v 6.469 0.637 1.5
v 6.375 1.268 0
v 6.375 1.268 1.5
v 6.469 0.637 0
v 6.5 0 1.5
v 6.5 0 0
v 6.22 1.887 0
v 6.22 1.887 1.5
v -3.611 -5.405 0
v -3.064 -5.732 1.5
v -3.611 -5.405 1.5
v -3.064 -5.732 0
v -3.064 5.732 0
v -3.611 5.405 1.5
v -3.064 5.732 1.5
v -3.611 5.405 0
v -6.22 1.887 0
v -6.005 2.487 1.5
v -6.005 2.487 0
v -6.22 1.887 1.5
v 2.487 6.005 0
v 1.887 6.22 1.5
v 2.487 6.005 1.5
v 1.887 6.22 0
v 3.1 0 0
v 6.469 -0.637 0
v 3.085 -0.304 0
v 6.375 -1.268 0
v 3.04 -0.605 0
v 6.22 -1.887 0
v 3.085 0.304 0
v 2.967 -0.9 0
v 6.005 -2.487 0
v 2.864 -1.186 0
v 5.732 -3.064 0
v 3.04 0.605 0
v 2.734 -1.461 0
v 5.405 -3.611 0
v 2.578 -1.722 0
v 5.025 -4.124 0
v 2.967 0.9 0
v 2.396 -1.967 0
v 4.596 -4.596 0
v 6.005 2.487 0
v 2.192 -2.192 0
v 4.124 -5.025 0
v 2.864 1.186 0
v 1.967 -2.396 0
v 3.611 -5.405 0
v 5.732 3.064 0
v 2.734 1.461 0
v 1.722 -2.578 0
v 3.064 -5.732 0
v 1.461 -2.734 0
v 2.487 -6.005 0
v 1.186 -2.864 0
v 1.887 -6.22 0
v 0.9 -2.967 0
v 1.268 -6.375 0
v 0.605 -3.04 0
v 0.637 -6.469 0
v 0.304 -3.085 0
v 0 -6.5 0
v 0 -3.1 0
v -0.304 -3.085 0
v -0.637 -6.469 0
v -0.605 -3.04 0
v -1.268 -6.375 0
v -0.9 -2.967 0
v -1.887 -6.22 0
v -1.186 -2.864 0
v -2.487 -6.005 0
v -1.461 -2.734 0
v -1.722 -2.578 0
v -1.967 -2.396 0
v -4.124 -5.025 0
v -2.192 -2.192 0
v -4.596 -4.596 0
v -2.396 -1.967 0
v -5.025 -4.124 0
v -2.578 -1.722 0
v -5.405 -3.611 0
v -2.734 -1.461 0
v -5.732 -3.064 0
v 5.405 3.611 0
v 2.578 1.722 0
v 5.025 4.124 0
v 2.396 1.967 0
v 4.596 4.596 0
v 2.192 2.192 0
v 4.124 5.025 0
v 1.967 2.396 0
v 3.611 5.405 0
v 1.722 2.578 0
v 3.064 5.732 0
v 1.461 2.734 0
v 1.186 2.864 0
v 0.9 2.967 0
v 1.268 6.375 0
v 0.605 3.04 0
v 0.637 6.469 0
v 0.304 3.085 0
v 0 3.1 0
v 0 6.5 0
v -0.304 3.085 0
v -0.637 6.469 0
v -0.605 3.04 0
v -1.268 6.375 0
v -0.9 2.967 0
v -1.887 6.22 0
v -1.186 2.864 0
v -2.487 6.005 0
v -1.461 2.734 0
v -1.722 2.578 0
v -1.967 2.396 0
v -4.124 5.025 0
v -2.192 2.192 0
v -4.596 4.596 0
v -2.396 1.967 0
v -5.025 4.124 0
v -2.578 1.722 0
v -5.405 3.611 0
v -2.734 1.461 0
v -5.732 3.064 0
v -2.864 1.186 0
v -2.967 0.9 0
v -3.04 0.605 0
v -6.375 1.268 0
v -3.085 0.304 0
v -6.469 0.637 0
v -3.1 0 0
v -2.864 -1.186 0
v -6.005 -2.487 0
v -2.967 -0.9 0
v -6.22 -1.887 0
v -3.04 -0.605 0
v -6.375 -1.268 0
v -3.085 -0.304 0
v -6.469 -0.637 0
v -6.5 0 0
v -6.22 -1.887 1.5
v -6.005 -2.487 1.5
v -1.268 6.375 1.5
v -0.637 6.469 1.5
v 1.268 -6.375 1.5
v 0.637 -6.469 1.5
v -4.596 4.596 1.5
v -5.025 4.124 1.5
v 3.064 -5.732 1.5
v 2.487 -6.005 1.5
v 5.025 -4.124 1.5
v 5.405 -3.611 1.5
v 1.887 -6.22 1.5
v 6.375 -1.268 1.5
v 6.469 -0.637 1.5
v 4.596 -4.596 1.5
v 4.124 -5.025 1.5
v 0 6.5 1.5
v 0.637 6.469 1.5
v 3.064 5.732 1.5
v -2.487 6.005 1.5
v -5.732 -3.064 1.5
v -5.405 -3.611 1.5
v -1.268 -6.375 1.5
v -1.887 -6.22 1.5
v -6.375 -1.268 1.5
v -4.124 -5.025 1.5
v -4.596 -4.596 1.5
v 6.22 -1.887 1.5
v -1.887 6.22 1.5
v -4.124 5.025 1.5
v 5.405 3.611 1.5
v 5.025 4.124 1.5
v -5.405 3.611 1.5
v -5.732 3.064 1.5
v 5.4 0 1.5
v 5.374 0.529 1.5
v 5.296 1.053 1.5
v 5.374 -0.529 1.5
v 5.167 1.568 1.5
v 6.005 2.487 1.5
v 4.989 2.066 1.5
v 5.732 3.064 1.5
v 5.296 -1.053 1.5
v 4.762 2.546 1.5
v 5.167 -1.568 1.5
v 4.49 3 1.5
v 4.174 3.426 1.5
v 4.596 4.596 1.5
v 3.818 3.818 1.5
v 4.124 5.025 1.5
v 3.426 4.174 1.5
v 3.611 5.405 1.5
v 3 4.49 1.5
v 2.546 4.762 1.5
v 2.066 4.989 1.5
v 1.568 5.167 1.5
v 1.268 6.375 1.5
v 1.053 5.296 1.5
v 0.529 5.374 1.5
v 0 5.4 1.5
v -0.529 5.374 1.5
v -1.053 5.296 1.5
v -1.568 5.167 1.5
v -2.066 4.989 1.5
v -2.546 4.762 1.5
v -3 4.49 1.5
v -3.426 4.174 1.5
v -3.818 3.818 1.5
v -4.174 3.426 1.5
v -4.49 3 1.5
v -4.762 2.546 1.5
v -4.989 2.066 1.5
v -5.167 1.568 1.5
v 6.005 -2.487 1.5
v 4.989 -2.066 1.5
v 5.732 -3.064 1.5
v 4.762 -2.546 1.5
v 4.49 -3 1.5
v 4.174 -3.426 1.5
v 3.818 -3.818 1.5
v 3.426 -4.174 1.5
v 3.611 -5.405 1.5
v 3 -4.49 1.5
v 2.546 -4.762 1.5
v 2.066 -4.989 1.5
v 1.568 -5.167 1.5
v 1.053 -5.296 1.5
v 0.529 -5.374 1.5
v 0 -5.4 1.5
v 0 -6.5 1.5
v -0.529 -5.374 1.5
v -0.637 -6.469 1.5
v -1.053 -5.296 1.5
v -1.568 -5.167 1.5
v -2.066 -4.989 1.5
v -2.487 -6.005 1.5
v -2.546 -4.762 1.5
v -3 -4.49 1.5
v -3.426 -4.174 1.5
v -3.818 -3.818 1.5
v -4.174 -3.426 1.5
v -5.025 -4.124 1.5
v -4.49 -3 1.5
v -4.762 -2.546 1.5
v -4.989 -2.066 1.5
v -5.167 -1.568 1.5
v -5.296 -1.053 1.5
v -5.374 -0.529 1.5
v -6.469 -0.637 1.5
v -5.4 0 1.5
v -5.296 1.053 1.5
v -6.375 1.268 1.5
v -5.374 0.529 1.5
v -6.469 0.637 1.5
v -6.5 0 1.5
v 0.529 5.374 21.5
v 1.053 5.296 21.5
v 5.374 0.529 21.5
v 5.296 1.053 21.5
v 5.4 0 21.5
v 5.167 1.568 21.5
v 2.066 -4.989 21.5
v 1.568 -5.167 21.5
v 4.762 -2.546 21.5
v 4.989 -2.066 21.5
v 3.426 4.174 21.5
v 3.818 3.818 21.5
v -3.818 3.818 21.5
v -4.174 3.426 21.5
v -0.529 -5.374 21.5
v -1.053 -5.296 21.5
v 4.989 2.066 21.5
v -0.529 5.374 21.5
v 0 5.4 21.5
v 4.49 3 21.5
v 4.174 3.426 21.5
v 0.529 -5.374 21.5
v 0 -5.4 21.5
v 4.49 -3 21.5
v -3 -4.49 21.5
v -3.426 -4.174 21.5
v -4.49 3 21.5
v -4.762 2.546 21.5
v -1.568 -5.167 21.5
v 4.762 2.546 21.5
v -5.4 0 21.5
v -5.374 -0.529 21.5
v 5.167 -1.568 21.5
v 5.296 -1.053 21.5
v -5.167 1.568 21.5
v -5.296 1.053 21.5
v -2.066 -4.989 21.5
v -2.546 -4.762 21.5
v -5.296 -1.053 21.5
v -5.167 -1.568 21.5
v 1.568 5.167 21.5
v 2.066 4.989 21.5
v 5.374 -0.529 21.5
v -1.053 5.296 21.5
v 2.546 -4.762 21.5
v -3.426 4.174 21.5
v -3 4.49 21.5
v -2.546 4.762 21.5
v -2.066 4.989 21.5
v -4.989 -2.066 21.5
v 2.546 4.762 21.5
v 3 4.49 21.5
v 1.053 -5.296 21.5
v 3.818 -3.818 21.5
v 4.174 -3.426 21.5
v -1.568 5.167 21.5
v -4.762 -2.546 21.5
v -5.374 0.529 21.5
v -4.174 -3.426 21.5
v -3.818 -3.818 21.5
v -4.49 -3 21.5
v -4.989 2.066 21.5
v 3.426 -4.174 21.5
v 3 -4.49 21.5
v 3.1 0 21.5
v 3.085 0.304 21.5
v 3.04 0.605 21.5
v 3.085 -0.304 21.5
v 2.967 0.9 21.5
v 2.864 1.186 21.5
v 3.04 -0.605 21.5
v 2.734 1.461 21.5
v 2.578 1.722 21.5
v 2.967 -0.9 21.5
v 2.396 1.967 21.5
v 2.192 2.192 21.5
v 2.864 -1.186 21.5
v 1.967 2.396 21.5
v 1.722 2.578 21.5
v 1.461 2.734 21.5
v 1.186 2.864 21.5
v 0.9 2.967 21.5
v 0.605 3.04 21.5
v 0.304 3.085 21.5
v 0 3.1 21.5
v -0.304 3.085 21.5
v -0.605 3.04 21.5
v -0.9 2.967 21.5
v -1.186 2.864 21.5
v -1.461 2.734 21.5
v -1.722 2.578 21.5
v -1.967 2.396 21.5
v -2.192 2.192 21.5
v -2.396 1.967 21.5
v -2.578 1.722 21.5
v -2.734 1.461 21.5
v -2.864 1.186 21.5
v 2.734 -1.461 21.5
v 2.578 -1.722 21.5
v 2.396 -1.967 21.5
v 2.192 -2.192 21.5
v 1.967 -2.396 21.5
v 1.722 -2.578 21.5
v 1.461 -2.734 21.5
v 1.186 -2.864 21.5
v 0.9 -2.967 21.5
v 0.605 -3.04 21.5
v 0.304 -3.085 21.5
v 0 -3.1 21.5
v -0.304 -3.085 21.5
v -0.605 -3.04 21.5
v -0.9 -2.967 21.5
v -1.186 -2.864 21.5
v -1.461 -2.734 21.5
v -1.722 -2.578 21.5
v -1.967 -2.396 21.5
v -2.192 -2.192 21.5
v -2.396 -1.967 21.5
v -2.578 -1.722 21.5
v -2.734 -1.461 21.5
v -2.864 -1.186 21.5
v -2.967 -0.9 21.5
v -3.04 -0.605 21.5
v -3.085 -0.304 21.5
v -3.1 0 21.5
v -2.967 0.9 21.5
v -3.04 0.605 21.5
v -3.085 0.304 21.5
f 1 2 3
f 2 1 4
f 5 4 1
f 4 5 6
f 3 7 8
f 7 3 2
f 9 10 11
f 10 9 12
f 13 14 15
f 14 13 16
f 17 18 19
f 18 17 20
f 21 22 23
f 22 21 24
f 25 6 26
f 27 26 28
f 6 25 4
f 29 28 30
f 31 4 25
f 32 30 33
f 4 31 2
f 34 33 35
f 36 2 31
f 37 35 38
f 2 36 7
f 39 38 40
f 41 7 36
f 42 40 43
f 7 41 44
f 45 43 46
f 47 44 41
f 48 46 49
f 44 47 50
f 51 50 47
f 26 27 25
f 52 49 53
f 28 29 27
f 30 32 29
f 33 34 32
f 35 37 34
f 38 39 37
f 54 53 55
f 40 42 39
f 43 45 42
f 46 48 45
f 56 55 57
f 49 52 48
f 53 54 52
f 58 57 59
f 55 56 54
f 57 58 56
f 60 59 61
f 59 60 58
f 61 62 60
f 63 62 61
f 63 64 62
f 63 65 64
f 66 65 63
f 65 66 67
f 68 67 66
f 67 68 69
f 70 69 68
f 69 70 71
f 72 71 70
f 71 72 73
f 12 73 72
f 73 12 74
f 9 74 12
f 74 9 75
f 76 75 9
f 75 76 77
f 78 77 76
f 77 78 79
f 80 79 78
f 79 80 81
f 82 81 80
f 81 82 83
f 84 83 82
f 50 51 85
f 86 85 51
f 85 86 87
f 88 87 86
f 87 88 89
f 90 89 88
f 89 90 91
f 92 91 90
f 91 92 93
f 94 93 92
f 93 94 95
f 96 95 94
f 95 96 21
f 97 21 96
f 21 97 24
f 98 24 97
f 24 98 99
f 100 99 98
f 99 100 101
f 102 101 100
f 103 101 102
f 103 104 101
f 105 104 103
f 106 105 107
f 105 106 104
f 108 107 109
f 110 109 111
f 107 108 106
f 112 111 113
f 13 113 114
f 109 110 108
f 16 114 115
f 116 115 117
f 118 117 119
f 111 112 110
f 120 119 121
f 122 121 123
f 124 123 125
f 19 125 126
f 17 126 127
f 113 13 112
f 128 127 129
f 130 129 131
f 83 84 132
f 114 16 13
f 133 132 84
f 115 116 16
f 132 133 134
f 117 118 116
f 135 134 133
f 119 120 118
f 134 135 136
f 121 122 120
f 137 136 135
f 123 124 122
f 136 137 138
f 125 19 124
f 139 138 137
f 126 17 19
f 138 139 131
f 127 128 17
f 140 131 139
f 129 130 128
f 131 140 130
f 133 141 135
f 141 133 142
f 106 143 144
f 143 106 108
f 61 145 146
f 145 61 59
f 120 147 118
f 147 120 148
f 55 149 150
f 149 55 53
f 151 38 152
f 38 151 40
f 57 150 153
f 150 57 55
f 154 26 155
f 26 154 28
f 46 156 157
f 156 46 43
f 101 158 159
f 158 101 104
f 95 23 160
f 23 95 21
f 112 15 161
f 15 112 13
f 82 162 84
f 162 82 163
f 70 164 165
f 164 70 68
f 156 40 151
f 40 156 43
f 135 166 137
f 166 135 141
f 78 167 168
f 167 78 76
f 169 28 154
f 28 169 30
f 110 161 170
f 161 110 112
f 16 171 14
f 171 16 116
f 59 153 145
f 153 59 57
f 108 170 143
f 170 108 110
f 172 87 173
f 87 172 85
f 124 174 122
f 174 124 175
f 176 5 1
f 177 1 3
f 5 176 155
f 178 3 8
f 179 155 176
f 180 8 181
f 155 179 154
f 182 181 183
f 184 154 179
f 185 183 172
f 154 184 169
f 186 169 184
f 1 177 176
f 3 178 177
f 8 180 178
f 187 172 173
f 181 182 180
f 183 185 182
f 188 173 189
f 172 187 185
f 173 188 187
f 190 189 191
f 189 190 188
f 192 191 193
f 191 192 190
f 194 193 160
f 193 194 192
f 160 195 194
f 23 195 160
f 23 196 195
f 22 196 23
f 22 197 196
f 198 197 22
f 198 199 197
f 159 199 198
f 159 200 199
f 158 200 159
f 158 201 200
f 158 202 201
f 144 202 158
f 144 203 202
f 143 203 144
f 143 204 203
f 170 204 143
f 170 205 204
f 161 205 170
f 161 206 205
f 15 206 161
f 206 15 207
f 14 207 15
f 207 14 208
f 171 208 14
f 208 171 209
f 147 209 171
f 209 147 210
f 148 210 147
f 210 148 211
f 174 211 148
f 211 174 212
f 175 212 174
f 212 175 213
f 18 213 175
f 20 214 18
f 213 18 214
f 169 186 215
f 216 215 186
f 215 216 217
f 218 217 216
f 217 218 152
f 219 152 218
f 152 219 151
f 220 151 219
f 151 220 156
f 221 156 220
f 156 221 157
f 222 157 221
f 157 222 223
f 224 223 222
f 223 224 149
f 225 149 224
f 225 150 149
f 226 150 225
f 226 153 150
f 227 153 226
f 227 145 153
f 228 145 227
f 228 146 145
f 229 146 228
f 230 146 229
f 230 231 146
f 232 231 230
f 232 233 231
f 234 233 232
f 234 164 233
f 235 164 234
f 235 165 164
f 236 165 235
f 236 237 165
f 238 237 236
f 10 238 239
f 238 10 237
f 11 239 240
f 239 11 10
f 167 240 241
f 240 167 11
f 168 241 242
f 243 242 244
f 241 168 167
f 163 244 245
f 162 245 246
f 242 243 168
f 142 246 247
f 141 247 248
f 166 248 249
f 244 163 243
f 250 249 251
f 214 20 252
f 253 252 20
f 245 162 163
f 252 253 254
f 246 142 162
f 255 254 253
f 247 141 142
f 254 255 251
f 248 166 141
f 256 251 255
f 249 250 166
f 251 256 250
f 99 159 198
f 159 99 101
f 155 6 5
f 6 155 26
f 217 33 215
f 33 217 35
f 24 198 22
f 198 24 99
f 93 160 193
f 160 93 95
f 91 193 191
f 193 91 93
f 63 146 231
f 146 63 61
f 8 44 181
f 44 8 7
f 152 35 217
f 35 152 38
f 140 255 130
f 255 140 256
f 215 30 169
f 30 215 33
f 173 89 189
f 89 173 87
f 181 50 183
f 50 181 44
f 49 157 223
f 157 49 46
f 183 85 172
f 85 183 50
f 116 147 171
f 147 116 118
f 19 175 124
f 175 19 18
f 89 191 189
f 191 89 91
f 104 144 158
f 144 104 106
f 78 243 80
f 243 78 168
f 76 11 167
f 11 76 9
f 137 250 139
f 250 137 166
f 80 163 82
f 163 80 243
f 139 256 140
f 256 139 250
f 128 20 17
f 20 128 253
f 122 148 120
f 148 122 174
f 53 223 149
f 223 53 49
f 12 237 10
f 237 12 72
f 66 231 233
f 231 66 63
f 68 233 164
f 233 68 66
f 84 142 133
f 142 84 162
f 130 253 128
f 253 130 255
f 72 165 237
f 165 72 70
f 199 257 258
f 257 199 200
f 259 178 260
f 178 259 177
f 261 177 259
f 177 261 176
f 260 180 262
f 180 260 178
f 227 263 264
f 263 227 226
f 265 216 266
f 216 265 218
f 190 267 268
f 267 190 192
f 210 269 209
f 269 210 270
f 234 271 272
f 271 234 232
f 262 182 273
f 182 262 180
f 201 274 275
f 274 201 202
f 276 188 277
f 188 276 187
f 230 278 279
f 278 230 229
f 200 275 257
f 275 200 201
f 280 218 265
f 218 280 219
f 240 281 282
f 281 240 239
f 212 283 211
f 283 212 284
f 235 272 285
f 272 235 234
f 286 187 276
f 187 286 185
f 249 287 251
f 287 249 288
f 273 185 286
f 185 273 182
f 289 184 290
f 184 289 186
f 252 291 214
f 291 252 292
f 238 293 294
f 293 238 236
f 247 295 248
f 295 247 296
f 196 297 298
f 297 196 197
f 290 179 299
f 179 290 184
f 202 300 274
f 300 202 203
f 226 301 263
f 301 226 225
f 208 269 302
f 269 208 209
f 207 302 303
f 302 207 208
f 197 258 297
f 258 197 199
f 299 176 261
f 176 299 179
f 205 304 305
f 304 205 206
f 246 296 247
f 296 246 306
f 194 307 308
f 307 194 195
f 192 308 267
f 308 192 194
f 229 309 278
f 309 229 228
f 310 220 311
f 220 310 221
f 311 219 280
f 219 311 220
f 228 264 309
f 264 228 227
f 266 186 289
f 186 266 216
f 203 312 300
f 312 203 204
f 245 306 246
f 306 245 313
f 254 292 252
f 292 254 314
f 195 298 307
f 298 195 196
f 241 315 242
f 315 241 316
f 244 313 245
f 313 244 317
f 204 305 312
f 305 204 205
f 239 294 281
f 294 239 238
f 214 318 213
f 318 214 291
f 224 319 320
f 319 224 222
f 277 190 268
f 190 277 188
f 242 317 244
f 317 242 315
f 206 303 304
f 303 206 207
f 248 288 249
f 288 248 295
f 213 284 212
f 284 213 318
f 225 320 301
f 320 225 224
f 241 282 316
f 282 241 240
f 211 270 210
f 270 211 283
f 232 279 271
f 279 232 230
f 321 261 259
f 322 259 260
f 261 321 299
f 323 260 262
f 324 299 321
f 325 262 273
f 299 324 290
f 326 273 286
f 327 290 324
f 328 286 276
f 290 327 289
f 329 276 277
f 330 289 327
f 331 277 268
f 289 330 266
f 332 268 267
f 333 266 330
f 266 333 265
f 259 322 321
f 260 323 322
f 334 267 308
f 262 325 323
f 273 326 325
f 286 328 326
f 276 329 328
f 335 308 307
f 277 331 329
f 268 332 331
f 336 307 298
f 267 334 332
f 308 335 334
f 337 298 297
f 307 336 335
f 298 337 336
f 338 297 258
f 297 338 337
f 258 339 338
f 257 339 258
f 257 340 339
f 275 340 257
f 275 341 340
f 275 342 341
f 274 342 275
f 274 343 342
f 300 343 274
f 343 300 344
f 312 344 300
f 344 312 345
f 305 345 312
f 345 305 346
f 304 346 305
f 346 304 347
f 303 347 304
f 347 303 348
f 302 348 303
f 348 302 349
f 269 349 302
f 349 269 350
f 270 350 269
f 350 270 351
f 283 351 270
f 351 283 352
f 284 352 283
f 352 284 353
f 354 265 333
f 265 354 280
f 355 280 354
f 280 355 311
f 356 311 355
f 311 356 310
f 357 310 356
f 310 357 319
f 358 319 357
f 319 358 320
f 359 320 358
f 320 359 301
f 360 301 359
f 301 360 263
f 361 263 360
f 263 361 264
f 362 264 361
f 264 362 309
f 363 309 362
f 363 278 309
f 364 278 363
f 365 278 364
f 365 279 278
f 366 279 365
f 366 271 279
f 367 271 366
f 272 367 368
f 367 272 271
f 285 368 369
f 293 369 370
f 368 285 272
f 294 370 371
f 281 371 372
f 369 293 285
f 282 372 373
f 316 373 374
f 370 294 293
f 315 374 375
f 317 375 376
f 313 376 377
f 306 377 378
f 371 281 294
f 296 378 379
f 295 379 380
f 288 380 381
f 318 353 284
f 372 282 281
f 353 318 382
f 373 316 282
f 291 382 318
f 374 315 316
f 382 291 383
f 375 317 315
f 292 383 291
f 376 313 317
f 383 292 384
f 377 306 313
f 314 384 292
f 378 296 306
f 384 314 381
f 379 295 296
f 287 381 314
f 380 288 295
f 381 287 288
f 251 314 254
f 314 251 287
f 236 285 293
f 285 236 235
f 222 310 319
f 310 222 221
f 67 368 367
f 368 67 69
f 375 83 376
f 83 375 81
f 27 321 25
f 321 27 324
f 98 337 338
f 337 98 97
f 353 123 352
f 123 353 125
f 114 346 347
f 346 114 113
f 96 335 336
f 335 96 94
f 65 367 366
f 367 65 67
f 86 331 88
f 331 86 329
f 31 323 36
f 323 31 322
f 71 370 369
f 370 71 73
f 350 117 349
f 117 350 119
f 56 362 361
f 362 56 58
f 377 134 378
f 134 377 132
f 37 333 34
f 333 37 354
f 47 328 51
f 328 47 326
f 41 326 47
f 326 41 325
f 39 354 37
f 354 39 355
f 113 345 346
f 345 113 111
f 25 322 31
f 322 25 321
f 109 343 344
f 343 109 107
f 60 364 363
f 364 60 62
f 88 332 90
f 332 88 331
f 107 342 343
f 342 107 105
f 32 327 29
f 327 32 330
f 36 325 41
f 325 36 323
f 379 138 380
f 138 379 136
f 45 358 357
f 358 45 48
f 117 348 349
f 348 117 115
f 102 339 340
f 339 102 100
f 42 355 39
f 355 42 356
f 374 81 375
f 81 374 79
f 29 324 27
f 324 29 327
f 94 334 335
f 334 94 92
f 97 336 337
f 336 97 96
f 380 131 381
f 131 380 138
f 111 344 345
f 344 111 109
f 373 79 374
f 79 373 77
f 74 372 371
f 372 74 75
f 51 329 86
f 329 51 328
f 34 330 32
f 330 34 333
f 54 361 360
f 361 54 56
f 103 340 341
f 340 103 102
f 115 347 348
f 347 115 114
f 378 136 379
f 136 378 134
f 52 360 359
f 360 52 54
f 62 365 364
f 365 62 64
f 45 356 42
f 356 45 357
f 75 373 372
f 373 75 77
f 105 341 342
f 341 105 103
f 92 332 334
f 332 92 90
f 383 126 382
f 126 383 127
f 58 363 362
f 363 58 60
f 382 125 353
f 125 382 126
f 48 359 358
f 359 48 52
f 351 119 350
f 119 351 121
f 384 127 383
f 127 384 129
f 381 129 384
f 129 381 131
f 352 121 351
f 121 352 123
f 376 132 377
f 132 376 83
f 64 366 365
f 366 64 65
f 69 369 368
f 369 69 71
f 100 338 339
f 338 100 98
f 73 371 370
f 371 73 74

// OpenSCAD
// PCR tube adapter sleeve - print upside down
// Units: mm

$fn = 64;

// --- Dimensions ---
collar_d      = 13;    // collar outer diameter
collar_t      = 1.5;   // collar thickness (z = 0 to 1.5)
sleeve_od     = 10.8;  // sleeve outer diameter
sleeve_h      = 20;    // sleeve body height above collar (z = 1.5 to 21.5)
bore_d        = 6.2;   // straight through-bore diameter
eps           = 0.5;   // cutter overshoot past faces

// Derived
sleeve_top_z  = collar_t + sleeve_h;  // 22.0 mm (full height)

difference() {
    union() {
        // Collar on the bed
        cylinder(d = collar_d, h = collar_t);

        // Sleeve body rising from the collar
        translate([0, 0, collar_t])
            cylinder(d = sleeve_od, h = sleeve_h);
    }

    // Full-height bore, open at both ends
    translate([0, 0, -eps])
        cylinder(d = bore_d, h = sleeve_top_z + 2 * eps);
}
